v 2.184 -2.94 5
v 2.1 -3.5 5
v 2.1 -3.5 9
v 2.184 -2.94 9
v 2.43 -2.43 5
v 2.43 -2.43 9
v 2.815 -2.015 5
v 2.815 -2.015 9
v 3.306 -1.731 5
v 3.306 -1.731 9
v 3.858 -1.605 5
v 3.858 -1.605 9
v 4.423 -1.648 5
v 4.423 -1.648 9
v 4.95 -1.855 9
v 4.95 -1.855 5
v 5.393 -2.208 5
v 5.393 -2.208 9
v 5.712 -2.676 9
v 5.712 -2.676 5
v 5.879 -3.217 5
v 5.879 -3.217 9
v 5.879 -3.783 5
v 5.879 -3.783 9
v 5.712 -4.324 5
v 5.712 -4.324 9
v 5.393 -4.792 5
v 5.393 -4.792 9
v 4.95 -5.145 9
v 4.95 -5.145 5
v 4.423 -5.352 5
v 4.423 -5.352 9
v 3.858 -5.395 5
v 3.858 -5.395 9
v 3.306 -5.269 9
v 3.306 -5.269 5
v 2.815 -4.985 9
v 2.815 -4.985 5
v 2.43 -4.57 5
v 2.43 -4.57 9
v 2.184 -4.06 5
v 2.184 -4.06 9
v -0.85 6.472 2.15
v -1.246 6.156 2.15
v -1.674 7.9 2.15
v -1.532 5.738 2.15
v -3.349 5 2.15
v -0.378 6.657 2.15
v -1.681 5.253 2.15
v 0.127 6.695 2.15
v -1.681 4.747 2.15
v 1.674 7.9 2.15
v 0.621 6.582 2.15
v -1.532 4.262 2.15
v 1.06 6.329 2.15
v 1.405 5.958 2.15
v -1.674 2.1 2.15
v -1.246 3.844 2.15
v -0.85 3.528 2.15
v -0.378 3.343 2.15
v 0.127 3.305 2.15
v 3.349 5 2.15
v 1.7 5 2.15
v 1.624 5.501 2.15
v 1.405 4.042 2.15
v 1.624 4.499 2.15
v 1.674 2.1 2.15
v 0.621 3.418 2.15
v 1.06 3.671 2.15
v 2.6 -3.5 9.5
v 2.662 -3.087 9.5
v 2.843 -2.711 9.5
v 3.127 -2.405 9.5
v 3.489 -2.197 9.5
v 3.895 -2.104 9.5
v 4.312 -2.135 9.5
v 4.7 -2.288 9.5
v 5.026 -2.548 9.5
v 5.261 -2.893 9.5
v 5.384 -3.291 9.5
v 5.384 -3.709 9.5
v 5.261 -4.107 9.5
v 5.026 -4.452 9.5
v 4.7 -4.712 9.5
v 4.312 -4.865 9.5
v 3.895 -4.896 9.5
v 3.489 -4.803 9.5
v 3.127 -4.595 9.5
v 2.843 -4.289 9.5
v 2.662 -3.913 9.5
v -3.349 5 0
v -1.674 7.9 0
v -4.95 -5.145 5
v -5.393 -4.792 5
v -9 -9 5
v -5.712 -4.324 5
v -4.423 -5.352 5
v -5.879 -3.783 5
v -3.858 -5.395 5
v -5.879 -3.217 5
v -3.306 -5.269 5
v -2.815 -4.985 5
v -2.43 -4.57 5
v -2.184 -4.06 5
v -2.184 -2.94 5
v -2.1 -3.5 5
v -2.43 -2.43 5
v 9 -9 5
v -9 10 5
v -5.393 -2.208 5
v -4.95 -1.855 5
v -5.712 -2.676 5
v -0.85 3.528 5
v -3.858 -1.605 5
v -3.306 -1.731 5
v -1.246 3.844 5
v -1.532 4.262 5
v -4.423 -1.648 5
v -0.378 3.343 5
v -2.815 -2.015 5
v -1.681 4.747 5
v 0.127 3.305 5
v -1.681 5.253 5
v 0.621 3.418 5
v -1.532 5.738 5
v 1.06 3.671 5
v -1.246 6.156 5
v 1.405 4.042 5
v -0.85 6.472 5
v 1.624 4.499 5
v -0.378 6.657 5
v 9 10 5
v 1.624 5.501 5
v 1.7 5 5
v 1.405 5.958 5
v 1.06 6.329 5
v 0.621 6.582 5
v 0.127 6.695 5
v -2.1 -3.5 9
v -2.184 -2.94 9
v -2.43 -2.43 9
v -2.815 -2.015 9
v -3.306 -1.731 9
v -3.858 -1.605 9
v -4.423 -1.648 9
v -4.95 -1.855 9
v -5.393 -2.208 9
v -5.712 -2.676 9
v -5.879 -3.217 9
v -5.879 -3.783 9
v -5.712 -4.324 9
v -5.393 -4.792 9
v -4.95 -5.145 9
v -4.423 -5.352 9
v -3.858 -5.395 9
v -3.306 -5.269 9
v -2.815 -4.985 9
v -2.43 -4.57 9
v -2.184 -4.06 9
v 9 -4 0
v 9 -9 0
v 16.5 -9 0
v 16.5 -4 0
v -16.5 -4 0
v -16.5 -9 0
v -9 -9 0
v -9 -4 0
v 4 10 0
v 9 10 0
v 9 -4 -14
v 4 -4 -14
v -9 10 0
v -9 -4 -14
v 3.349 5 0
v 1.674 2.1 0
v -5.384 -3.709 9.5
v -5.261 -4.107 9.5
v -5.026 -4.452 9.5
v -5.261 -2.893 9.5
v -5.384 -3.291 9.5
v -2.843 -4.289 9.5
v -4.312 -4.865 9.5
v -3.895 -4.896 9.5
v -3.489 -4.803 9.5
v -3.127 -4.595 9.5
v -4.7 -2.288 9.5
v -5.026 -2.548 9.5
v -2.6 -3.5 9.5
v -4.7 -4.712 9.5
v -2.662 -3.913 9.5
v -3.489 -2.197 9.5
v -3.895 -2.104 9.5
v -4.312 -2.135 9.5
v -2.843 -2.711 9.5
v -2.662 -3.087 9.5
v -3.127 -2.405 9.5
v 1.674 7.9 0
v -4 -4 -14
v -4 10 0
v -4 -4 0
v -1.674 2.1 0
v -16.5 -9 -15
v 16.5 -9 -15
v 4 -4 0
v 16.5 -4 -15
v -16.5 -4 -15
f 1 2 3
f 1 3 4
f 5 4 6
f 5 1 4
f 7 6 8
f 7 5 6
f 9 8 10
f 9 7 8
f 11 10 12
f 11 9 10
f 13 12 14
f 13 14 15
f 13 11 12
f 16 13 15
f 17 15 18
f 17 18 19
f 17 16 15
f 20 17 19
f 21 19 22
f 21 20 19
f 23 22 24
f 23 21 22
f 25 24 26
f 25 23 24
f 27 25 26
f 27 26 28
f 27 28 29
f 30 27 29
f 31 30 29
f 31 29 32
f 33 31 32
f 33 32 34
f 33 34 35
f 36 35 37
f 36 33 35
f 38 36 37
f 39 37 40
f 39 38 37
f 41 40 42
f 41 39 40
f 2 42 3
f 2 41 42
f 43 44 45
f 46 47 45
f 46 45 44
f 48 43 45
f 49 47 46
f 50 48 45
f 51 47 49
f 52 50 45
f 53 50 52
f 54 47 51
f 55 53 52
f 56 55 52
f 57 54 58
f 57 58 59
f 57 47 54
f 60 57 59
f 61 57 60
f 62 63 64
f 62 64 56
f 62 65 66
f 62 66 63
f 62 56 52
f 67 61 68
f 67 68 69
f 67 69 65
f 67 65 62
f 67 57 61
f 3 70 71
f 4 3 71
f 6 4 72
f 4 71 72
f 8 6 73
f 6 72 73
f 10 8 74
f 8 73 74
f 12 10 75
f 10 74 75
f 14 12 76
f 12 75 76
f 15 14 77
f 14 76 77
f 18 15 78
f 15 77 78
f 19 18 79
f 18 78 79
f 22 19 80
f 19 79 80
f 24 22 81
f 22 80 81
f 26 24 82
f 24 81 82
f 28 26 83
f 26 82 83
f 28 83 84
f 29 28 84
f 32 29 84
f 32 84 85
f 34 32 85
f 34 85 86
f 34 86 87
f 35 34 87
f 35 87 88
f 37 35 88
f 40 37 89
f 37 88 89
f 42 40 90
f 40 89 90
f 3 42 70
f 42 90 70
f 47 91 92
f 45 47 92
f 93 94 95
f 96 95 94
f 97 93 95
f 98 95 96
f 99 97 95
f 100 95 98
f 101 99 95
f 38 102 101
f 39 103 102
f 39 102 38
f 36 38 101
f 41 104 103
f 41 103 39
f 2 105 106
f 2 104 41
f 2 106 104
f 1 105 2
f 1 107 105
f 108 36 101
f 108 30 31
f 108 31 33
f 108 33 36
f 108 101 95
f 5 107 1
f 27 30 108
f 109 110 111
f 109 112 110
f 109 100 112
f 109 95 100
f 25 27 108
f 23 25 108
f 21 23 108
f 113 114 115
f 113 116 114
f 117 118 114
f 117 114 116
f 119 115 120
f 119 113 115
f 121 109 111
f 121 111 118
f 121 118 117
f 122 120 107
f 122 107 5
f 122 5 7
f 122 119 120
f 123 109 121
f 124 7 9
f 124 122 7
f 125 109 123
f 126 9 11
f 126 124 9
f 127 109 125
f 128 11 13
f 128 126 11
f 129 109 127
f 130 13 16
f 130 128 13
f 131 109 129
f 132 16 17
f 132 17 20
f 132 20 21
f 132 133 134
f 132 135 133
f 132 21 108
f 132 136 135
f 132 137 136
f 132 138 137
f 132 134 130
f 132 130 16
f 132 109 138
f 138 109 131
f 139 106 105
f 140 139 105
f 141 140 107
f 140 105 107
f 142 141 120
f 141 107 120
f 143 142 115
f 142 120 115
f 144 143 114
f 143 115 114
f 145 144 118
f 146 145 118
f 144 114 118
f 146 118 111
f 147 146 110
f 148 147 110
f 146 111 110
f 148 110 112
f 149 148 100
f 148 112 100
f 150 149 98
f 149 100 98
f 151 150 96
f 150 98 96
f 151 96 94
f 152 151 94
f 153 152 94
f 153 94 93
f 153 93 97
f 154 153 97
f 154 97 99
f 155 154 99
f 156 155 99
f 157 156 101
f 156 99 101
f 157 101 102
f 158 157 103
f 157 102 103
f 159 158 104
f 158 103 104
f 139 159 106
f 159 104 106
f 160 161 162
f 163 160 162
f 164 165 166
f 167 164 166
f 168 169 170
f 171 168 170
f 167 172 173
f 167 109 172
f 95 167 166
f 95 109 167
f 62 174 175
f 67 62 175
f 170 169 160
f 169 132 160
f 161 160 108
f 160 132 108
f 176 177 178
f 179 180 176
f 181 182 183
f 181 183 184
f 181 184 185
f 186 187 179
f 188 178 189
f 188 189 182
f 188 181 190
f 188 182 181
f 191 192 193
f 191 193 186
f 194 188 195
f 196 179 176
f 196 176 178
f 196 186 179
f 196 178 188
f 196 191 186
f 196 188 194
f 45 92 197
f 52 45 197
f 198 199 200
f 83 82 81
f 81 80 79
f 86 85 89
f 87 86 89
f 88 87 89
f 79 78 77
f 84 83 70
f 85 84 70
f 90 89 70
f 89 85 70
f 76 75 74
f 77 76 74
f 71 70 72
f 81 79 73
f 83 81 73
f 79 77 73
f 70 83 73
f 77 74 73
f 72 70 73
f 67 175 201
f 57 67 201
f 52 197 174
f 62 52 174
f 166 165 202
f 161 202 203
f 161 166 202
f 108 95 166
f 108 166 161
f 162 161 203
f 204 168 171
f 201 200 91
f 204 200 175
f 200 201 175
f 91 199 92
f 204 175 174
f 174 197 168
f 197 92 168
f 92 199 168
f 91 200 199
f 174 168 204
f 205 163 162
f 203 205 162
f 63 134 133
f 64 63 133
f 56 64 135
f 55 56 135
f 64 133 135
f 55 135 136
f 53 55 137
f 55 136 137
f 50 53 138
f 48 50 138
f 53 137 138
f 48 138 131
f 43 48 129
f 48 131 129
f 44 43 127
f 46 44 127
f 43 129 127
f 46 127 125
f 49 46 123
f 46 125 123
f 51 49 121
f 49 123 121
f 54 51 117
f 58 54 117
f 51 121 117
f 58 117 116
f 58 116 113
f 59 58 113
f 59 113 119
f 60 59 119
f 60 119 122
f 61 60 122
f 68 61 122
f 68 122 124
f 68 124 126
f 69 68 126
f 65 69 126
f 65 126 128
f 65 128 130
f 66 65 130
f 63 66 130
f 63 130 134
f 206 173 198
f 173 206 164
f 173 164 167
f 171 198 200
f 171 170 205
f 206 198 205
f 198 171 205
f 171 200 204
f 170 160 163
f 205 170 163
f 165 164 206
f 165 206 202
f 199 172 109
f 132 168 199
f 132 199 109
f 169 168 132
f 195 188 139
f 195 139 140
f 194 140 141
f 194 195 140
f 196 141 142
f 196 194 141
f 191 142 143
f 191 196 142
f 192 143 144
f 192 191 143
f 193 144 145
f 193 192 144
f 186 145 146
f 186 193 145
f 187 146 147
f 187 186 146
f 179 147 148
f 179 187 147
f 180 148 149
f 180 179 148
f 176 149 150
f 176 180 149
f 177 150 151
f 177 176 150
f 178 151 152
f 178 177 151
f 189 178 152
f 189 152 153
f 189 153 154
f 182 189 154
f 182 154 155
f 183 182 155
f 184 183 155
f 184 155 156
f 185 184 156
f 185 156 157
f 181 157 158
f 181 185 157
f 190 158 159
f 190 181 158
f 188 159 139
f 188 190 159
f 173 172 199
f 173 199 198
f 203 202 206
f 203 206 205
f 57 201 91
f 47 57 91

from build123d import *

# Parameters (mm, degrees)
SKETCH_W     = 18
SKETCH_H     = 19
PAD_DEPTH    = 5
SKETCH001_R  = 1.7
HOLE_DEPTH   = 5.001
POCKET_DEPTH = 2.15
SKETCH003_R  = 1.9
PAD001_DEPTH = 4.5
CHAMFER_SIZE = 0.5
SKETCH004_W  = 33
SKETCH004_H  = 5
PAD002_DEPTH = 15
PAD003_DEPTH = 5


with BuildPart() as part:
    # Sketch → Pad (new body)
    with BuildSketch(Plane.XY):
        with Locations((0, 0.5)):
            Rectangle(SKETCH_W, SKETCH_H)
    extrude(amount=PAD_DEPTH)

    # Sketch001 (on Face6 of Pad) → Hole (cut, through all)
    with BuildSketch(Plane.XY.offset(5)):
        with Locations((0, 5)):
            Circle(SKETCH001_R)
    extrude(amount=-HOLE_DEPTH, mode=Mode.SUBTRACT)

    # Sketch002 (on Face4 of Hole) → Pocket (cut)
    with BuildSketch(Plane(origin=(0, 0, 0), x_dir=(1, 0, 0), z_dir=(0, 0, -1))):
        Polygon((3.348632, -5), (1.674316, -2.1), (-1.674316, -2.1), (-3.348632, -5), (-1.674316, -7.9), (1.674316, -7.9), align=None)
    extrude(amount=-POCKET_DEPTH, mode=Mode.SUBTRACT)

    # Sketch003 (on Face5 of Pocket) → Pad001 (join)
    with BuildSketch(Plane.XY.offset(5)):
        with Locations((-4, -3.5)):
            Circle(SKETCH003_R)
    pad001 = extrude(amount=PAD001_DEPTH)

    # Mirrored: Pad001 across YZ
    add(pad001.mirror(Plane.YZ))

    # Chamfer
    chamfer_edges = [part.edges().sort_by_distance(p)[0] for p in [
        (-5.9, -3.5, 9.5),
        (5.9, -3.5, 9.5),
    ]]
    chamfer(chamfer_edges, length=CHAMFER_SIZE)

    # Sketch004 (on Face4 of Pocket) → Pad002 (join)
    with BuildSketch(Plane(origin=(0, 0, 0), x_dir=(1, 0, 0), z_dir=(0, 0, -1))):
        with Locations((0, 6.5)):
            Rectangle(SKETCH004_W, SKETCH004_H)
    extrude(amount=PAD002_DEPTH)

    # Sketch005 (on Face7 of Pad002) → Pad003 (join)
    with BuildSketch(Plane.YZ.offset(9)):
        Polygon((10, 0), (-4, -14), (-4, 0), align=None)
    pad003 = extrude(amount=-PAD003_DEPTH)

    # Mirrored001: Pad003 across YZ
    add(pad003.mirror(Plane.YZ))


solid = part.part
